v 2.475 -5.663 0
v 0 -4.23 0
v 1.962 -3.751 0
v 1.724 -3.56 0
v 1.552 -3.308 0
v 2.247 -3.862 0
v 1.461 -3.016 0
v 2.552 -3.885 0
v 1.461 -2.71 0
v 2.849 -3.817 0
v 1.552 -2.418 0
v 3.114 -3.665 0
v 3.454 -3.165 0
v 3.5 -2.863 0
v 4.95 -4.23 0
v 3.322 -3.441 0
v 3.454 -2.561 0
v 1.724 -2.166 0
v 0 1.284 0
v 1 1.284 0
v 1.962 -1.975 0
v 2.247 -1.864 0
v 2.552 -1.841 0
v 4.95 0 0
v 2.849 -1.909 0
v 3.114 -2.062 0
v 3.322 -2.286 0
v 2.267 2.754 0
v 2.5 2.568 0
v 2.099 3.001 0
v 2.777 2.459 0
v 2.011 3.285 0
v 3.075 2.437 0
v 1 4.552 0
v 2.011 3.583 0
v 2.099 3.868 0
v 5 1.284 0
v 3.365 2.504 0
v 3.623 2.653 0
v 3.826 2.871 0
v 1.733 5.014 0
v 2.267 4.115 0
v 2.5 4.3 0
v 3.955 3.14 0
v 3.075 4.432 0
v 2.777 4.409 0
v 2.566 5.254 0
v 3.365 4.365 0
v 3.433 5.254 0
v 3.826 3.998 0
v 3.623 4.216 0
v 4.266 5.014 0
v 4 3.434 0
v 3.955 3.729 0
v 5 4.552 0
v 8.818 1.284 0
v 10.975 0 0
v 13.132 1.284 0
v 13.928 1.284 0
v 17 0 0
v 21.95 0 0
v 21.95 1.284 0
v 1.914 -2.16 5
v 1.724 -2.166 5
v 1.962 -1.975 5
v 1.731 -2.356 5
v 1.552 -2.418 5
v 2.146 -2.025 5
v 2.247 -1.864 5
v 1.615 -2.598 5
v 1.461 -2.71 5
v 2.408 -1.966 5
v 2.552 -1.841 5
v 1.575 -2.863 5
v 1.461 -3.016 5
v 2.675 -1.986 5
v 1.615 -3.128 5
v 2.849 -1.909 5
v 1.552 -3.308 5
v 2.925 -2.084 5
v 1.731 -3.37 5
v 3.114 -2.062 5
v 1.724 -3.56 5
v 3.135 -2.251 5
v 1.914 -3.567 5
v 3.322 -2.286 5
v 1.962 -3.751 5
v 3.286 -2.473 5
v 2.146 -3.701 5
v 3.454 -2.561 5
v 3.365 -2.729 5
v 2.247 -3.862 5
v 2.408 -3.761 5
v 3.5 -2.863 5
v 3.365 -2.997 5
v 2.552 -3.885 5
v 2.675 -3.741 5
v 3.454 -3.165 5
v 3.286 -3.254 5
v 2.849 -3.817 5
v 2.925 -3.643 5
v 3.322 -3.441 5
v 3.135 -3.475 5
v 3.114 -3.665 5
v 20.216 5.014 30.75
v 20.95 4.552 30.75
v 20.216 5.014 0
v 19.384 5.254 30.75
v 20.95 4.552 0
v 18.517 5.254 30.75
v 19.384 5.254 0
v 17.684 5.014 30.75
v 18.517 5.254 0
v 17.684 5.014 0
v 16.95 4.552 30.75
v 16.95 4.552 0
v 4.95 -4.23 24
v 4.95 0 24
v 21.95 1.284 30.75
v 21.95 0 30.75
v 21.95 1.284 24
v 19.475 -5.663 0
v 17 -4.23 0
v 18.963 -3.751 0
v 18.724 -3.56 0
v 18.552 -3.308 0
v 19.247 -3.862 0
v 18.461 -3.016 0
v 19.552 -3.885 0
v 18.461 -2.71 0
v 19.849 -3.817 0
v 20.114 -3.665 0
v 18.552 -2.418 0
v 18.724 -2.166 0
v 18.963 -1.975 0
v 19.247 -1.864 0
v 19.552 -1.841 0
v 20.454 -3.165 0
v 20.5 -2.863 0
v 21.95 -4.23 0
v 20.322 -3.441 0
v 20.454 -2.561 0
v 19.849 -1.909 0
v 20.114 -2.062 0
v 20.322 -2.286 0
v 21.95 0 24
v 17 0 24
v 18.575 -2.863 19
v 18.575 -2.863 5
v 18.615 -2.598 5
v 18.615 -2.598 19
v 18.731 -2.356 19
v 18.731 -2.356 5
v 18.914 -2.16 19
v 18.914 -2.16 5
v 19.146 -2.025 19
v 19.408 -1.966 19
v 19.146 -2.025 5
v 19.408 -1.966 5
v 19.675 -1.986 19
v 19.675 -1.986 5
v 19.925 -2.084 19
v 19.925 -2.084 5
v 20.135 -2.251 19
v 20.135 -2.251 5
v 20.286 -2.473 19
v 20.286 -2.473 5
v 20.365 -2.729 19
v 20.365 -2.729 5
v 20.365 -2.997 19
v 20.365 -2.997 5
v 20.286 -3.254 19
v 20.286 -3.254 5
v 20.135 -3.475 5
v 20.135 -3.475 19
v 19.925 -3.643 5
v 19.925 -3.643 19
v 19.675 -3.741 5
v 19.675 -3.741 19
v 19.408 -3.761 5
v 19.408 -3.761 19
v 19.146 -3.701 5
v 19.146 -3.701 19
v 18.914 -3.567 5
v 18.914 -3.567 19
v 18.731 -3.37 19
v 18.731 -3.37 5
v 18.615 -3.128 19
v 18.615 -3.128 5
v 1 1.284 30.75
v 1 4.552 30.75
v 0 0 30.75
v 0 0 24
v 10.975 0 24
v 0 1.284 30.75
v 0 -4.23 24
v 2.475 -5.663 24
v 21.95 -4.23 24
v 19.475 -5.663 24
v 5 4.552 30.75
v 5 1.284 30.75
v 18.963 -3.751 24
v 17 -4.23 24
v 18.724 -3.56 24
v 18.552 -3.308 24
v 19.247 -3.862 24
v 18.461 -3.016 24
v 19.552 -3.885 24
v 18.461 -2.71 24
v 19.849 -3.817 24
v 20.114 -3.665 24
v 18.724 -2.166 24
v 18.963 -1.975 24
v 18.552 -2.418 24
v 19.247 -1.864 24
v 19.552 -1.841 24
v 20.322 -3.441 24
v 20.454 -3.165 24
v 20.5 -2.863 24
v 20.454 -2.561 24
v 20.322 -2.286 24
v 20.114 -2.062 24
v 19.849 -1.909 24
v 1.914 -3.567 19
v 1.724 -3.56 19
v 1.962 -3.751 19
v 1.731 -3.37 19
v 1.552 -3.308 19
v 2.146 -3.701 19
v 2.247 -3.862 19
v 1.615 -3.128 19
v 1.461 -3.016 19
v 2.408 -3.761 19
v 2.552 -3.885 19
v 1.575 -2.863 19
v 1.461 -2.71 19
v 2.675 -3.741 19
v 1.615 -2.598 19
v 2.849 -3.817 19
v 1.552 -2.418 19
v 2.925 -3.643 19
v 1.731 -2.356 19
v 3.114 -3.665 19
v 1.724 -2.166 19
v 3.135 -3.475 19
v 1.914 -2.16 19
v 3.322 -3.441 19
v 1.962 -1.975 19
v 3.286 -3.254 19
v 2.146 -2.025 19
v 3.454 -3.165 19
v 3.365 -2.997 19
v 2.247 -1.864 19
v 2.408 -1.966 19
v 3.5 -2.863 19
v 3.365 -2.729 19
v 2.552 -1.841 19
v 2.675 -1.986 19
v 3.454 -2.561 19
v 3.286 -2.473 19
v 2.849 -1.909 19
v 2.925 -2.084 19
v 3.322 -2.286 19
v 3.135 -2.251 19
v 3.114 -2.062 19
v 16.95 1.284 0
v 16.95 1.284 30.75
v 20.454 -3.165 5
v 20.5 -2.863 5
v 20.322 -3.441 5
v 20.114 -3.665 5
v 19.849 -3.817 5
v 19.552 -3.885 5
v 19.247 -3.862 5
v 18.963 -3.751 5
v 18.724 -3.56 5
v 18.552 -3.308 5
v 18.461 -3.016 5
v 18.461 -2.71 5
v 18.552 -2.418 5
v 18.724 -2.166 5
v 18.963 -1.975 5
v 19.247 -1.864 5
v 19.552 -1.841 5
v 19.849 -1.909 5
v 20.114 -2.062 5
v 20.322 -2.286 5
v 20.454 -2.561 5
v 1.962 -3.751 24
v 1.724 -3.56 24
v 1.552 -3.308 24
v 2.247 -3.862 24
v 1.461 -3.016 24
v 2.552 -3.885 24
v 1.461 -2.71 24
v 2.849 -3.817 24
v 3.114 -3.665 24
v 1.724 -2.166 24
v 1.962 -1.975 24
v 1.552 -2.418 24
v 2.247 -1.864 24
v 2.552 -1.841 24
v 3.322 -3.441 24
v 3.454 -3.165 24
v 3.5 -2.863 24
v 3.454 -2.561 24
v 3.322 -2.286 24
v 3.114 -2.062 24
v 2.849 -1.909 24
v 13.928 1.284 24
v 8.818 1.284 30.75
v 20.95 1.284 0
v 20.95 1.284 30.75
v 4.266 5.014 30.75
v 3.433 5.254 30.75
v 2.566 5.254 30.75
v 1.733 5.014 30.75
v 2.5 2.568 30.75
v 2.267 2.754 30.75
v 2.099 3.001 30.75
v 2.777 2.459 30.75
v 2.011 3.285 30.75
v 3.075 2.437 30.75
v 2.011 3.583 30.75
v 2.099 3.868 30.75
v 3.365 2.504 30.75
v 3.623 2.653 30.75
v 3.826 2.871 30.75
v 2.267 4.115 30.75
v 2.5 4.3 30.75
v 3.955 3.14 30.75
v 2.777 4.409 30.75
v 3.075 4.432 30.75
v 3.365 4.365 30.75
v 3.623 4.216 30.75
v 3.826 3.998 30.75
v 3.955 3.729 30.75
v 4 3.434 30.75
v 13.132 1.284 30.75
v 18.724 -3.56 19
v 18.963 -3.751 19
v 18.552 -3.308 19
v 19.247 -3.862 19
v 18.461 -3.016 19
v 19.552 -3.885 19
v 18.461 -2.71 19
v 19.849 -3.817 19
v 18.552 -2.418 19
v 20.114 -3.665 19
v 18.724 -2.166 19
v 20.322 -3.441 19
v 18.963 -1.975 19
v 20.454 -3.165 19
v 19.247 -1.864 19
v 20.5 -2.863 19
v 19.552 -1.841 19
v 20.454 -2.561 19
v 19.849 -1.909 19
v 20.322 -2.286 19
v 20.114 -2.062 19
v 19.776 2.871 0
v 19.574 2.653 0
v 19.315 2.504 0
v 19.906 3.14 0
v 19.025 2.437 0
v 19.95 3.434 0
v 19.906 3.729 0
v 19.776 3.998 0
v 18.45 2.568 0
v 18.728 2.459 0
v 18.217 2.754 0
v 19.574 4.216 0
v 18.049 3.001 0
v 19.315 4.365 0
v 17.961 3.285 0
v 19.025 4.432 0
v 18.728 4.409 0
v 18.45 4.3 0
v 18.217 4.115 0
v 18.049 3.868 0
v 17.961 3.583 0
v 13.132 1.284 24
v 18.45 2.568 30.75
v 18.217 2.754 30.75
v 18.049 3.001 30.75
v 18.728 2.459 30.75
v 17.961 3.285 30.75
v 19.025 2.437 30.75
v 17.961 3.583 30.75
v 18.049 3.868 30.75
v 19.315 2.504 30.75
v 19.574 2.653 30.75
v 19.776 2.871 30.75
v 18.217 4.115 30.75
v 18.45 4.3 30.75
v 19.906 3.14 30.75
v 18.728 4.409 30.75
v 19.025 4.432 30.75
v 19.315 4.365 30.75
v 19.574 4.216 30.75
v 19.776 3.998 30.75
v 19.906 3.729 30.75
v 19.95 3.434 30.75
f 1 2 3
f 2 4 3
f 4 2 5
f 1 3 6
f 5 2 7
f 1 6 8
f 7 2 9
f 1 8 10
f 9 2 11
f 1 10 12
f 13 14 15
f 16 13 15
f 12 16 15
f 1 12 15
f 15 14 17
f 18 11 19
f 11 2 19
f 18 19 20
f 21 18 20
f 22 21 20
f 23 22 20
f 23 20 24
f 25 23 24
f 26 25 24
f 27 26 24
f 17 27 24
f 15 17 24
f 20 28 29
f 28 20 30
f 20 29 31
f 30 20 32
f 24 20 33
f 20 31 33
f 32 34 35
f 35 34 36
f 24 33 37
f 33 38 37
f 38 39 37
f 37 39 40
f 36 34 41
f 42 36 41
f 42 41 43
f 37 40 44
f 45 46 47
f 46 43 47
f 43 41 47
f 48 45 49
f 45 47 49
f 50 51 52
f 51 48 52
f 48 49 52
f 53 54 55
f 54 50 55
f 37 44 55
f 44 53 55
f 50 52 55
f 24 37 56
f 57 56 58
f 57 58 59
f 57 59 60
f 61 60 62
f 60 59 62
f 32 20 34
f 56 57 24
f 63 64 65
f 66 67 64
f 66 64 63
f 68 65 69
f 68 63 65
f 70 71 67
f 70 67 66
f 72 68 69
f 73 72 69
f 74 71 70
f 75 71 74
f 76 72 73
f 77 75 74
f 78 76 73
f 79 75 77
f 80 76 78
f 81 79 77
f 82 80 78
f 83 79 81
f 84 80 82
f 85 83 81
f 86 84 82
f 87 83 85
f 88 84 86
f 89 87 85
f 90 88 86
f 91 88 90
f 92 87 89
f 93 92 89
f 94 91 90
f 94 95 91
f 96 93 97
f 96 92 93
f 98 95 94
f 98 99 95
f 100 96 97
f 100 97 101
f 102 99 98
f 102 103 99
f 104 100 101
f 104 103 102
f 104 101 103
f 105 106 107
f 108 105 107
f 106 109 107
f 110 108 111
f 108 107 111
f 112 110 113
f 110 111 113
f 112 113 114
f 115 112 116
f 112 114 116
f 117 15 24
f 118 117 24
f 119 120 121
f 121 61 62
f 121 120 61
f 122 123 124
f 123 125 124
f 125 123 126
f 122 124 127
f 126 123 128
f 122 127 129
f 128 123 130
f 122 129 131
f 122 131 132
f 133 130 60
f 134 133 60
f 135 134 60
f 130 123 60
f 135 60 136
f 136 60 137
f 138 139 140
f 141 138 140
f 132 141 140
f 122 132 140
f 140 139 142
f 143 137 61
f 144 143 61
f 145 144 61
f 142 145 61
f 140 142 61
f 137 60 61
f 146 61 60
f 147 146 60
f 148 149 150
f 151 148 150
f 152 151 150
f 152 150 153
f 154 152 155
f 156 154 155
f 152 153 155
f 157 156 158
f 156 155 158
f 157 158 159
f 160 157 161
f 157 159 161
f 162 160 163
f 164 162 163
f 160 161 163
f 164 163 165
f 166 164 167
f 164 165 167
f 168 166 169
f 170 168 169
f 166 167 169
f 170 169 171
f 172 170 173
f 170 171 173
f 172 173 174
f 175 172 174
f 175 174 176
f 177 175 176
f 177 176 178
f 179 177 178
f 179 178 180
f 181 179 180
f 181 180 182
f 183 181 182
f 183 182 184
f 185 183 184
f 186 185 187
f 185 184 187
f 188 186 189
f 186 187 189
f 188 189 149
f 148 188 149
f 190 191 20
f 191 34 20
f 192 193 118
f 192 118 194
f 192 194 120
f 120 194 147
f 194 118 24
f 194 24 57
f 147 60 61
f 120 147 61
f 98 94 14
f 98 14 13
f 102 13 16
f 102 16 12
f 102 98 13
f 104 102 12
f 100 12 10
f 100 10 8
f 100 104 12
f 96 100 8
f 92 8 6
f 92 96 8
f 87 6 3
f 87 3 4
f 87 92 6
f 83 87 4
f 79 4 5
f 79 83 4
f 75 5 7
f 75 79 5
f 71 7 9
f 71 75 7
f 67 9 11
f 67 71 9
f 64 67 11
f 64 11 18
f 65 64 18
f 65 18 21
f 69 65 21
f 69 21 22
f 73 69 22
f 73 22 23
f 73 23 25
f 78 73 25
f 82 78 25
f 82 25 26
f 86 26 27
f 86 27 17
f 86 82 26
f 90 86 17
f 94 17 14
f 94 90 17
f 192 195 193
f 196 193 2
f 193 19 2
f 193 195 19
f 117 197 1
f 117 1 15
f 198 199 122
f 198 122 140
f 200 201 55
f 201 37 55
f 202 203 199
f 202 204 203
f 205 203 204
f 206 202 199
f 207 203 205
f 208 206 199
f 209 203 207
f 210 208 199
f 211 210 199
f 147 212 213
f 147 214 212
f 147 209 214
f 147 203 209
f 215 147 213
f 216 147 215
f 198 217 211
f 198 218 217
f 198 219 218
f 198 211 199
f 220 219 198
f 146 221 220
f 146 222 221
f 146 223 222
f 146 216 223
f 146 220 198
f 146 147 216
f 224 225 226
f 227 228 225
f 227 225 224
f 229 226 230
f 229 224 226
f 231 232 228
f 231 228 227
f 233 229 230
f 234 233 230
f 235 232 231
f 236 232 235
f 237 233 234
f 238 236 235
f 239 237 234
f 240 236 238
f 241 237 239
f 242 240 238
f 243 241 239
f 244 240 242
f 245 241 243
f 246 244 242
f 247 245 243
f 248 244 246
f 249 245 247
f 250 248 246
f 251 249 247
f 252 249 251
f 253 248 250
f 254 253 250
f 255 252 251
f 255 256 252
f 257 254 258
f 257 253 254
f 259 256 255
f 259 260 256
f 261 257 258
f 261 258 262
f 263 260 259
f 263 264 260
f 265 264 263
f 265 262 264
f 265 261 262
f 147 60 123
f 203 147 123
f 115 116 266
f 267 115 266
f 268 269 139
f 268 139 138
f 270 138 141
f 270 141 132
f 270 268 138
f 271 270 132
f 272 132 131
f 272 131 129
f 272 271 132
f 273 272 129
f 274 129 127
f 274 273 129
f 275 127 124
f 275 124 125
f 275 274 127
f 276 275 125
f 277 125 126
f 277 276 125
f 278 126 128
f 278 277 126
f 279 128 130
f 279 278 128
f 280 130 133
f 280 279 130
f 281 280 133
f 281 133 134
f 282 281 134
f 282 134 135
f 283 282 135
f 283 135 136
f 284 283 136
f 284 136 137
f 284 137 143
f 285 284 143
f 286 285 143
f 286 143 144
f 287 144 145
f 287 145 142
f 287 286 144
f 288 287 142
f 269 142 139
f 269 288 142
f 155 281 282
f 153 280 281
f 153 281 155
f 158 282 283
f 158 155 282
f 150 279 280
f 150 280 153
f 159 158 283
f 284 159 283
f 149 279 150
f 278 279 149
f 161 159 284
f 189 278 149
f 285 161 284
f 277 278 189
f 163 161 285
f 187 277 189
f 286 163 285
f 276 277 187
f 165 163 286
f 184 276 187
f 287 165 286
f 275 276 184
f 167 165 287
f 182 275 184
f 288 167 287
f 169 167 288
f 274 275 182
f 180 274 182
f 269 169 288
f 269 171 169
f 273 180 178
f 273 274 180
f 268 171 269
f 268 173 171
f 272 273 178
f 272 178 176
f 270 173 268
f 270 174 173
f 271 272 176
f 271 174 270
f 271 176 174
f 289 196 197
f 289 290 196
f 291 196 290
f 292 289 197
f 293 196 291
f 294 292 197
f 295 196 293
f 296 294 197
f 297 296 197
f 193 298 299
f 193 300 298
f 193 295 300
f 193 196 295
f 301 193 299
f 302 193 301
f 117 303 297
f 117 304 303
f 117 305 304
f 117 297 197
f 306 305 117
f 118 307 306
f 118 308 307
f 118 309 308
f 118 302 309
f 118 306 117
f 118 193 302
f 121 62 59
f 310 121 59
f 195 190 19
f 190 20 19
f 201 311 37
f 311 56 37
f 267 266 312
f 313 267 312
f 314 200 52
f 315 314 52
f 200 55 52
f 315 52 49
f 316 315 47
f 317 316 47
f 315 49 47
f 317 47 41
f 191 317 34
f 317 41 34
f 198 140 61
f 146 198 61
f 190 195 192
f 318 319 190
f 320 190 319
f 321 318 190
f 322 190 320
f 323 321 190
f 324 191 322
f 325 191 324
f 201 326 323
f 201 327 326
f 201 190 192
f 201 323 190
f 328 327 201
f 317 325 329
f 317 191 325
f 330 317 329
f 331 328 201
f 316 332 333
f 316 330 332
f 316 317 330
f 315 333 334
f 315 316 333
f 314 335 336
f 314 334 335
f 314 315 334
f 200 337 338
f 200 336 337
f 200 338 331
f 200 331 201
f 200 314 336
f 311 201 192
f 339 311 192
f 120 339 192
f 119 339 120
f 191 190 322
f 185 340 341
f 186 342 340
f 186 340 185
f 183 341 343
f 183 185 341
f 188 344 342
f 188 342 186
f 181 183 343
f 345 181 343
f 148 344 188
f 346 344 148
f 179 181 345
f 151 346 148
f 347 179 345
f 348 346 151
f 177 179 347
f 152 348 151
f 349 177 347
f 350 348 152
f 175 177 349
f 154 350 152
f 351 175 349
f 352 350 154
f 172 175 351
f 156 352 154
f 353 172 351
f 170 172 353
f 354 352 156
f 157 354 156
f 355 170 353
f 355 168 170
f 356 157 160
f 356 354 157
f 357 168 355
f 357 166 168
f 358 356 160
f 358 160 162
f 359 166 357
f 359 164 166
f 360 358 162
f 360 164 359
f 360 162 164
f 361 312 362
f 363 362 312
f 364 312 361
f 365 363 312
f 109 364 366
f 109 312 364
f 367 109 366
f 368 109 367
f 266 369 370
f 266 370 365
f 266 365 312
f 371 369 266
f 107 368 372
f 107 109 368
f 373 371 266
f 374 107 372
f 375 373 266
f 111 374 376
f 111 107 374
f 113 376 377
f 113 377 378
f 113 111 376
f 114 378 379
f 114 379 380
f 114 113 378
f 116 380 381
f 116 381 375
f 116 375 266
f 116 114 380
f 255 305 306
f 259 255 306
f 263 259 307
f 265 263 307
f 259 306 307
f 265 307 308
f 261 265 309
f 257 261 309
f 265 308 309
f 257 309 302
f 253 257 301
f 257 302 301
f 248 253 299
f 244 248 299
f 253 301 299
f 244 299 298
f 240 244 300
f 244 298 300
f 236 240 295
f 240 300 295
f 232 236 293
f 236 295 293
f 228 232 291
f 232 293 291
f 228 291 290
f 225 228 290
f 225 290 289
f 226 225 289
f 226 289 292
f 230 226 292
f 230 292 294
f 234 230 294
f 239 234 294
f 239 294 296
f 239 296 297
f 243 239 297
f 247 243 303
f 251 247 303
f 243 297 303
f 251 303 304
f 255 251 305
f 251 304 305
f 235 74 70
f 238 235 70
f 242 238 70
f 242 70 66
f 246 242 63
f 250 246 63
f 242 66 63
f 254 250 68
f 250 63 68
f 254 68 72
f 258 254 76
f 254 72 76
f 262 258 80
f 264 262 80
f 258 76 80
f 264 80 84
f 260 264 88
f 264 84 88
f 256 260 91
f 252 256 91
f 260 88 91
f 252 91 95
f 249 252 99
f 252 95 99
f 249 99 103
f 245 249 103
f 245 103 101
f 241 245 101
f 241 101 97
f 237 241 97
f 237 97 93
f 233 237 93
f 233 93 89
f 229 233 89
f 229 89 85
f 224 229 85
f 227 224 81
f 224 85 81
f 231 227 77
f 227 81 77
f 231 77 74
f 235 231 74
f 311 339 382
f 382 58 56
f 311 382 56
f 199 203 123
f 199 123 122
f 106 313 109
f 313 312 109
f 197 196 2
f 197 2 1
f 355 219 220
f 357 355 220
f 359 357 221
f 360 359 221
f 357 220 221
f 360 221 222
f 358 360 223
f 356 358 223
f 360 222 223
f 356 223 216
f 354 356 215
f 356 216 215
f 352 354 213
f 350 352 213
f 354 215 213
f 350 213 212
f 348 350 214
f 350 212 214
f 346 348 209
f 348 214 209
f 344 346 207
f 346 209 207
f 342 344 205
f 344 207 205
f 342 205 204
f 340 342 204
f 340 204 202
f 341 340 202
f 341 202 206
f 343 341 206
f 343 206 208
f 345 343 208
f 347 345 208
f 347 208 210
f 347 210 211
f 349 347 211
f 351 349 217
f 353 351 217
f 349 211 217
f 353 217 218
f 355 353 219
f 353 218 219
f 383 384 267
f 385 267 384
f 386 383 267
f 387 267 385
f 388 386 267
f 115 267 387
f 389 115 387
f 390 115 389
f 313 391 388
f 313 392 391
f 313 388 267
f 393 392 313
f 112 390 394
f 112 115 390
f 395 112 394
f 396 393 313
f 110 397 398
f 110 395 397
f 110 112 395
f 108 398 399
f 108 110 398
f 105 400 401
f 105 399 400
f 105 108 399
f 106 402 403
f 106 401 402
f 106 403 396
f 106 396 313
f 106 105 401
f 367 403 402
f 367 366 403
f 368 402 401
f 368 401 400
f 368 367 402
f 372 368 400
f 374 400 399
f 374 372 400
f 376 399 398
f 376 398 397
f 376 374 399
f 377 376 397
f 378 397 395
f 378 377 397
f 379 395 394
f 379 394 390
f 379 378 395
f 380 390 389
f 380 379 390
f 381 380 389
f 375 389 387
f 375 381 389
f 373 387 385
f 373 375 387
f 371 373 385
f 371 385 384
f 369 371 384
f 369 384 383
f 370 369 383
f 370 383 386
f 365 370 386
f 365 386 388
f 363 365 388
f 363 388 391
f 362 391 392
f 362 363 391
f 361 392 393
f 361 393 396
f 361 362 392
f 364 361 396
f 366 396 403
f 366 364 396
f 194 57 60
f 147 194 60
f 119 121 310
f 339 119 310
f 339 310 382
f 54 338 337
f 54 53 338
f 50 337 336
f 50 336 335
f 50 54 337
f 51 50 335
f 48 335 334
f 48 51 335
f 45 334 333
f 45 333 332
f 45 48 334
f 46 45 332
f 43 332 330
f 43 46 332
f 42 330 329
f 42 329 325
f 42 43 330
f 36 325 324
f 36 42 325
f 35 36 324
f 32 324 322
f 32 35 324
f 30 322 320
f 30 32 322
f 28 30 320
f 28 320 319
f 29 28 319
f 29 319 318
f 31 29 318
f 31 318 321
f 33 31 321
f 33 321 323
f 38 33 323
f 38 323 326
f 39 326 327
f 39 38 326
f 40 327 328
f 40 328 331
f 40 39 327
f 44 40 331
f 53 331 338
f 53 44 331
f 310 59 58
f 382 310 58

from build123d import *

# Parameters (mm, degrees)
BOSS_EXTRUDE2_DEPTH     = 24
BOSS_EXTRUDE2_2_DEPTH   = 24
SKETCH6_R               = 1.025
CUT_EXTRUDE1_DEPTH      = 5
CUT_EXTRUDE2_START      = -5
SKETCH7_R               = 1.025
CUT_EXTRUDE2_DEPTH      = 5
SKETCH8_R               = 0.9
CUT_EXTRUDE3_DEPTH      = 14
CUT_EXTRUDE4_DEPTH      = 24
BOSS_EXTRUDE3_DEPTH     = 24
SKETCH13_R              = 1
CUT_EXTRUDE5_DEPTH      = 24
BOSS_EXTRUDE5_OUTLINE_R = 1
BOSS_EXTRUDE5_DEPTH     = 6.75


# Read off the part's stored shape, not the designer's step: Boss-Extrude5
with BuildPart() as part:
    # Sketch3 → Boss-Extrude2 (new body)
    with BuildSketch(Plane.XY):
        with BuildLine():
            Line((0, 1.284473501), (0, -4.23))
            Line((0, -4.23), (2.475, -5.663169564))
            Line((2.475, -5.663169564), (4.95, -4.23))
            Line((4.95, -4.23), (4.95, 0))
            Line((4.95, 0), (10.974918748, 0))
            Line((10.974918748, 0), (17, -0.000257875))
            Line((17, -0.000257875), (17, 0))
            Line((17, 0), (21.949837505, 0))
            Line((21.949837505, 0), (21.949892461, 1.28400377))
            Line((21.949892461, 1.28400377), (13.928131848, 1.284347104))
            Line((13.928131848, 1.284347104), (13.13155756, 1.284381197))
            Line((13.13155756, 1.284381197), (12.329651428, 1.886055123))
            ThreePointArc((12.329651428, 1.886055123), (12.474649771, 2.499007586), (12.355214929, 3.117449627))
            ThreePointArc((12.355214929, 3.117449627), (10.359172253, 3.897908673), (9.620266793, 1.886113105))
            Line((9.620266793, 1.886113105), (8.81833491, 1.284473501))
            Line((8.81833491, 1.284473501), (0, 1.284473501))
        make_face()
    extrude(amount=BOSS_EXTRUDE2_DEPTH)


with BuildPart() as body_2:
    # Sketch3 → Boss-Extrude2 2 (new body)
    with BuildSketch(Plane.XY):
        Polygon((21.949837485, -0.00046973), (17, -0.000257875), (17, -4.23), (19.475, -5.663169564), (21.95, -4.23), (21.95, 0), (21.949837505, 0), align=None)
    extrude(amount=BOSS_EXTRUDE2_2_DEPTH)


with BuildPart() as cut_extrude1_tool:
    # Sketch6 → Cut-Extrude1 (new body)
    with BuildSketch(Plane.XY.offset(24)):
        with Locations((2.475, -2.863169564)):
            Circle(SKETCH6_R)
        with Locations((19.475, -2.863169564)):
            Circle(SKETCH6_R)
    extrude(amount=-CUT_EXTRUDE1_DEPTH)


with BuildPart() as part_1:
    add(part.part)

    # Cut-Extrude1: cut by cut_extrude1_tool
    add(cut_extrude1_tool.part, mode=Mode.SUBTRACT)


with BuildPart() as body_2_1:
    add(body_2.part)

    # Cut-Extrude1: cut by cut_extrude1_tool
    add(cut_extrude1_tool.part, mode=Mode.SUBTRACT)


with BuildPart() as cut_extrude2_tool:
    # Sketch7 → Cut-Extrude2 (new body)
    with BuildSketch(Plane(origin=(0, 0, 0), x_dir=(-1, 0, 0), z_dir=(0, 0, -1)).offset(CUT_EXTRUDE2_START)):
        with Locations(Location((-19.475, -2.863169564, 0), (0, 0, 180))):
            Circle(SKETCH7_R)
        with Locations(Location((-2.475, -2.863169564, 0), (0, 0, 180))):
            Circle(SKETCH7_R)
    extrude(amount=CUT_EXTRUDE2_DEPTH)


with BuildPart() as part_2:
    add(part_1.part)

    # Cut-Extrude2: cut by cut_extrude2_tool
    add(cut_extrude2_tool.part, mode=Mode.SUBTRACT)


with BuildPart() as body_2_2:
    add(body_2_1.part)

    # Cut-Extrude2: cut by cut_extrude2_tool
    add(cut_extrude2_tool.part, mode=Mode.SUBTRACT)


with BuildPart() as cut_extrude3_tool:
    # Sketch8 → Cut-Extrude3 (new body)
    with BuildSketch(Plane(origin=(0, 0, 5), x_dir=(-1, 0, 0), z_dir=(0, 0, -1))):
        with Locations((-19.475, -2.863169564)):
            Circle(SKETCH8_R)
        with Locations((-2.475, -2.863169564)):
            Circle(SKETCH8_R)
    extrude(amount=-CUT_EXTRUDE3_DEPTH)


with BuildPart() as part_3:
    add(part_2.part)

    # Cut-Extrude3: cut by cut_extrude3_tool
    add(cut_extrude3_tool.part, mode=Mode.SUBTRACT)

    # Sketch9 → Cut-Extrude4 (cut)
    with BuildSketch(Plane.XY.offset(24)):
        Polygon((8.81833491, 1.284473501), (13.13155756, 1.284381197), (13.13155756, 4.431882999), (8.81833491, 4.431882999), align=None)
    extrude(amount=-CUT_EXTRUDE4_DEPTH, mode=Mode.SUBTRACT)

    # Sketch10 → Boss-Extrude3 (add)
    with BuildSketch(Plane.XY.offset(24)):
        with BuildLine():
            Line((0.99983047, 1.284473501), (4.99983047, 1.284473501))
            Line((4.99983047, 1.284473501), (4.99983047, 4.551800372))
            ThreePointArc((4.99983047, 4.551800372), (2.99983047, 5.284473501), (0.99983047, 4.551800372))
            Line((0.99983047, 4.551800372), (0.99983047, 1.284473501))
        make_face()
        with BuildLine():
            Line((20.950061999, 1.284473501), (16.950061999, 1.284473501))
            Line((16.950061999, 1.284473501), (16.950061999, 4.551800372))
            ThreePointArc((16.950061999, 4.551800372), (18.950061999, 5.284473501), (20.950061999, 4.551800372))
            Line((20.950061999, 4.551800372), (20.950061999, 1.284473501))
        make_face()
    extrude(amount=-BOSS_EXTRUDE3_DEPTH)


with BuildPart() as body_2_3:
    add(body_2_2.part)

    # Cut-Extrude3: cut by cut_extrude3_tool
    add(cut_extrude3_tool.part, mode=Mode.SUBTRACT)


with BuildPart() as boss_extrude3_piece_1:
    # of the separate pieces the step leaves, piece 1, a body of its own (boss_extrude3_pieces)
    add(part_3.part.solids().sort_by_distance((8.81833491, 1.284473501, 0))[0])


with BuildPart() as boss_extrude3_piece_2:
    # of the separate pieces the step leaves, piece 2, a body of its own (boss_extrude3_pieces)
    add(part_3.part.solids().sort_by_distance((20.950061999, 1.284473501, 24))[0])


with BuildPart() as cut_extrude5_tool:
    # Sketch13 → Cut-Extrude5 (new body)
    with BuildSketch(Plane.XY.offset(24)):
        with Locations((2.99983047, 3.434387417)):
            Circle(SKETCH13_R)
        with Locations((18.950061999, 3.434387417)):
            Circle(SKETCH13_R)
    extrude(amount=-CUT_EXTRUDE5_DEPTH)


with BuildPart() as boss_extrude3_piece_1_1:
    add(boss_extrude3_piece_1.part)

    # Cut-Extrude5: cut by cut_extrude5_tool
    add(cut_extrude5_tool.part, mode=Mode.SUBTRACT)


with BuildPart() as boss_extrude3_piece_2_1:
    add(boss_extrude3_piece_2.part)

    # Cut-Extrude5: cut by cut_extrude5_tool
    add(cut_extrude5_tool.part, mode=Mode.SUBTRACT)


    add(boss_extrude3_piece_1_1.part)  # Boss-Extrude5 merges Boss-Extrude3 piece 1
    # Boss-Extrude5 outline → Boss-Extrude5 (add)
    # profile 1 of 2: a face of its own
    with BuildSketch(Plane.XY.offset(24)):
        with BuildLine():
            Line((16.950061999, 1.284473501), (20.950061999, 1.284473501))
            Line((20.950061999, 1.284473501), (20.950061999, 4.551800372))
            ThreePointArc((20.950061999, 4.551800372), (18.950061999, 5.284473501), (16.950061999, 4.551800372))
            Line((16.950061999, 4.551800372), (16.950061999, 1.284473501))
        make_face()
        with Locations((18.950061999, 3.434387417)):
            Circle(BOSS_EXTRUDE5_OUTLINE_R, mode=Mode.SUBTRACT)
    # profile 2 of 2: a face of its own
    with BuildSketch(Plane.XY.offset(24)):
        with BuildLine():
            Line((13.13155756, 1.284381197), (8.81833491, 1.284473501))
            Line((8.81833491, 1.284473501), (4.99983047, 1.284473501))
            Line((4.99983047, 1.284473501), (4.99983047, 4.551800372))
            ThreePointArc((4.99983047, 4.551800372), (2.99983047, 5.284473501), (0.99983047, 4.551800372))
            Line((0.99983047, 4.551800372), (0.99983047, 1.284473501))
            Line((0.99983047, 1.284473501), (0, 1.284473501))
            Line((0, 1.284473501), (0, 0))
            Line((0, 0), (21.949837505, 0))
            Line((21.949837505, 0), (21.949892461, 1.28400377))
            Line((21.949892461, 1.28400377), (13.13155756, 1.284381197))
        make_face()
        with Locations((2.99983047, 3.434387417)):
            Circle(BOSS_EXTRUDE5_OUTLINE_R, mode=Mode.SUBTRACT)
    extrude(amount=BOSS_EXTRUDE5_DEPTH)


solid = Compound([body_2_3.part, boss_extrude3_piece_2_1.part])
